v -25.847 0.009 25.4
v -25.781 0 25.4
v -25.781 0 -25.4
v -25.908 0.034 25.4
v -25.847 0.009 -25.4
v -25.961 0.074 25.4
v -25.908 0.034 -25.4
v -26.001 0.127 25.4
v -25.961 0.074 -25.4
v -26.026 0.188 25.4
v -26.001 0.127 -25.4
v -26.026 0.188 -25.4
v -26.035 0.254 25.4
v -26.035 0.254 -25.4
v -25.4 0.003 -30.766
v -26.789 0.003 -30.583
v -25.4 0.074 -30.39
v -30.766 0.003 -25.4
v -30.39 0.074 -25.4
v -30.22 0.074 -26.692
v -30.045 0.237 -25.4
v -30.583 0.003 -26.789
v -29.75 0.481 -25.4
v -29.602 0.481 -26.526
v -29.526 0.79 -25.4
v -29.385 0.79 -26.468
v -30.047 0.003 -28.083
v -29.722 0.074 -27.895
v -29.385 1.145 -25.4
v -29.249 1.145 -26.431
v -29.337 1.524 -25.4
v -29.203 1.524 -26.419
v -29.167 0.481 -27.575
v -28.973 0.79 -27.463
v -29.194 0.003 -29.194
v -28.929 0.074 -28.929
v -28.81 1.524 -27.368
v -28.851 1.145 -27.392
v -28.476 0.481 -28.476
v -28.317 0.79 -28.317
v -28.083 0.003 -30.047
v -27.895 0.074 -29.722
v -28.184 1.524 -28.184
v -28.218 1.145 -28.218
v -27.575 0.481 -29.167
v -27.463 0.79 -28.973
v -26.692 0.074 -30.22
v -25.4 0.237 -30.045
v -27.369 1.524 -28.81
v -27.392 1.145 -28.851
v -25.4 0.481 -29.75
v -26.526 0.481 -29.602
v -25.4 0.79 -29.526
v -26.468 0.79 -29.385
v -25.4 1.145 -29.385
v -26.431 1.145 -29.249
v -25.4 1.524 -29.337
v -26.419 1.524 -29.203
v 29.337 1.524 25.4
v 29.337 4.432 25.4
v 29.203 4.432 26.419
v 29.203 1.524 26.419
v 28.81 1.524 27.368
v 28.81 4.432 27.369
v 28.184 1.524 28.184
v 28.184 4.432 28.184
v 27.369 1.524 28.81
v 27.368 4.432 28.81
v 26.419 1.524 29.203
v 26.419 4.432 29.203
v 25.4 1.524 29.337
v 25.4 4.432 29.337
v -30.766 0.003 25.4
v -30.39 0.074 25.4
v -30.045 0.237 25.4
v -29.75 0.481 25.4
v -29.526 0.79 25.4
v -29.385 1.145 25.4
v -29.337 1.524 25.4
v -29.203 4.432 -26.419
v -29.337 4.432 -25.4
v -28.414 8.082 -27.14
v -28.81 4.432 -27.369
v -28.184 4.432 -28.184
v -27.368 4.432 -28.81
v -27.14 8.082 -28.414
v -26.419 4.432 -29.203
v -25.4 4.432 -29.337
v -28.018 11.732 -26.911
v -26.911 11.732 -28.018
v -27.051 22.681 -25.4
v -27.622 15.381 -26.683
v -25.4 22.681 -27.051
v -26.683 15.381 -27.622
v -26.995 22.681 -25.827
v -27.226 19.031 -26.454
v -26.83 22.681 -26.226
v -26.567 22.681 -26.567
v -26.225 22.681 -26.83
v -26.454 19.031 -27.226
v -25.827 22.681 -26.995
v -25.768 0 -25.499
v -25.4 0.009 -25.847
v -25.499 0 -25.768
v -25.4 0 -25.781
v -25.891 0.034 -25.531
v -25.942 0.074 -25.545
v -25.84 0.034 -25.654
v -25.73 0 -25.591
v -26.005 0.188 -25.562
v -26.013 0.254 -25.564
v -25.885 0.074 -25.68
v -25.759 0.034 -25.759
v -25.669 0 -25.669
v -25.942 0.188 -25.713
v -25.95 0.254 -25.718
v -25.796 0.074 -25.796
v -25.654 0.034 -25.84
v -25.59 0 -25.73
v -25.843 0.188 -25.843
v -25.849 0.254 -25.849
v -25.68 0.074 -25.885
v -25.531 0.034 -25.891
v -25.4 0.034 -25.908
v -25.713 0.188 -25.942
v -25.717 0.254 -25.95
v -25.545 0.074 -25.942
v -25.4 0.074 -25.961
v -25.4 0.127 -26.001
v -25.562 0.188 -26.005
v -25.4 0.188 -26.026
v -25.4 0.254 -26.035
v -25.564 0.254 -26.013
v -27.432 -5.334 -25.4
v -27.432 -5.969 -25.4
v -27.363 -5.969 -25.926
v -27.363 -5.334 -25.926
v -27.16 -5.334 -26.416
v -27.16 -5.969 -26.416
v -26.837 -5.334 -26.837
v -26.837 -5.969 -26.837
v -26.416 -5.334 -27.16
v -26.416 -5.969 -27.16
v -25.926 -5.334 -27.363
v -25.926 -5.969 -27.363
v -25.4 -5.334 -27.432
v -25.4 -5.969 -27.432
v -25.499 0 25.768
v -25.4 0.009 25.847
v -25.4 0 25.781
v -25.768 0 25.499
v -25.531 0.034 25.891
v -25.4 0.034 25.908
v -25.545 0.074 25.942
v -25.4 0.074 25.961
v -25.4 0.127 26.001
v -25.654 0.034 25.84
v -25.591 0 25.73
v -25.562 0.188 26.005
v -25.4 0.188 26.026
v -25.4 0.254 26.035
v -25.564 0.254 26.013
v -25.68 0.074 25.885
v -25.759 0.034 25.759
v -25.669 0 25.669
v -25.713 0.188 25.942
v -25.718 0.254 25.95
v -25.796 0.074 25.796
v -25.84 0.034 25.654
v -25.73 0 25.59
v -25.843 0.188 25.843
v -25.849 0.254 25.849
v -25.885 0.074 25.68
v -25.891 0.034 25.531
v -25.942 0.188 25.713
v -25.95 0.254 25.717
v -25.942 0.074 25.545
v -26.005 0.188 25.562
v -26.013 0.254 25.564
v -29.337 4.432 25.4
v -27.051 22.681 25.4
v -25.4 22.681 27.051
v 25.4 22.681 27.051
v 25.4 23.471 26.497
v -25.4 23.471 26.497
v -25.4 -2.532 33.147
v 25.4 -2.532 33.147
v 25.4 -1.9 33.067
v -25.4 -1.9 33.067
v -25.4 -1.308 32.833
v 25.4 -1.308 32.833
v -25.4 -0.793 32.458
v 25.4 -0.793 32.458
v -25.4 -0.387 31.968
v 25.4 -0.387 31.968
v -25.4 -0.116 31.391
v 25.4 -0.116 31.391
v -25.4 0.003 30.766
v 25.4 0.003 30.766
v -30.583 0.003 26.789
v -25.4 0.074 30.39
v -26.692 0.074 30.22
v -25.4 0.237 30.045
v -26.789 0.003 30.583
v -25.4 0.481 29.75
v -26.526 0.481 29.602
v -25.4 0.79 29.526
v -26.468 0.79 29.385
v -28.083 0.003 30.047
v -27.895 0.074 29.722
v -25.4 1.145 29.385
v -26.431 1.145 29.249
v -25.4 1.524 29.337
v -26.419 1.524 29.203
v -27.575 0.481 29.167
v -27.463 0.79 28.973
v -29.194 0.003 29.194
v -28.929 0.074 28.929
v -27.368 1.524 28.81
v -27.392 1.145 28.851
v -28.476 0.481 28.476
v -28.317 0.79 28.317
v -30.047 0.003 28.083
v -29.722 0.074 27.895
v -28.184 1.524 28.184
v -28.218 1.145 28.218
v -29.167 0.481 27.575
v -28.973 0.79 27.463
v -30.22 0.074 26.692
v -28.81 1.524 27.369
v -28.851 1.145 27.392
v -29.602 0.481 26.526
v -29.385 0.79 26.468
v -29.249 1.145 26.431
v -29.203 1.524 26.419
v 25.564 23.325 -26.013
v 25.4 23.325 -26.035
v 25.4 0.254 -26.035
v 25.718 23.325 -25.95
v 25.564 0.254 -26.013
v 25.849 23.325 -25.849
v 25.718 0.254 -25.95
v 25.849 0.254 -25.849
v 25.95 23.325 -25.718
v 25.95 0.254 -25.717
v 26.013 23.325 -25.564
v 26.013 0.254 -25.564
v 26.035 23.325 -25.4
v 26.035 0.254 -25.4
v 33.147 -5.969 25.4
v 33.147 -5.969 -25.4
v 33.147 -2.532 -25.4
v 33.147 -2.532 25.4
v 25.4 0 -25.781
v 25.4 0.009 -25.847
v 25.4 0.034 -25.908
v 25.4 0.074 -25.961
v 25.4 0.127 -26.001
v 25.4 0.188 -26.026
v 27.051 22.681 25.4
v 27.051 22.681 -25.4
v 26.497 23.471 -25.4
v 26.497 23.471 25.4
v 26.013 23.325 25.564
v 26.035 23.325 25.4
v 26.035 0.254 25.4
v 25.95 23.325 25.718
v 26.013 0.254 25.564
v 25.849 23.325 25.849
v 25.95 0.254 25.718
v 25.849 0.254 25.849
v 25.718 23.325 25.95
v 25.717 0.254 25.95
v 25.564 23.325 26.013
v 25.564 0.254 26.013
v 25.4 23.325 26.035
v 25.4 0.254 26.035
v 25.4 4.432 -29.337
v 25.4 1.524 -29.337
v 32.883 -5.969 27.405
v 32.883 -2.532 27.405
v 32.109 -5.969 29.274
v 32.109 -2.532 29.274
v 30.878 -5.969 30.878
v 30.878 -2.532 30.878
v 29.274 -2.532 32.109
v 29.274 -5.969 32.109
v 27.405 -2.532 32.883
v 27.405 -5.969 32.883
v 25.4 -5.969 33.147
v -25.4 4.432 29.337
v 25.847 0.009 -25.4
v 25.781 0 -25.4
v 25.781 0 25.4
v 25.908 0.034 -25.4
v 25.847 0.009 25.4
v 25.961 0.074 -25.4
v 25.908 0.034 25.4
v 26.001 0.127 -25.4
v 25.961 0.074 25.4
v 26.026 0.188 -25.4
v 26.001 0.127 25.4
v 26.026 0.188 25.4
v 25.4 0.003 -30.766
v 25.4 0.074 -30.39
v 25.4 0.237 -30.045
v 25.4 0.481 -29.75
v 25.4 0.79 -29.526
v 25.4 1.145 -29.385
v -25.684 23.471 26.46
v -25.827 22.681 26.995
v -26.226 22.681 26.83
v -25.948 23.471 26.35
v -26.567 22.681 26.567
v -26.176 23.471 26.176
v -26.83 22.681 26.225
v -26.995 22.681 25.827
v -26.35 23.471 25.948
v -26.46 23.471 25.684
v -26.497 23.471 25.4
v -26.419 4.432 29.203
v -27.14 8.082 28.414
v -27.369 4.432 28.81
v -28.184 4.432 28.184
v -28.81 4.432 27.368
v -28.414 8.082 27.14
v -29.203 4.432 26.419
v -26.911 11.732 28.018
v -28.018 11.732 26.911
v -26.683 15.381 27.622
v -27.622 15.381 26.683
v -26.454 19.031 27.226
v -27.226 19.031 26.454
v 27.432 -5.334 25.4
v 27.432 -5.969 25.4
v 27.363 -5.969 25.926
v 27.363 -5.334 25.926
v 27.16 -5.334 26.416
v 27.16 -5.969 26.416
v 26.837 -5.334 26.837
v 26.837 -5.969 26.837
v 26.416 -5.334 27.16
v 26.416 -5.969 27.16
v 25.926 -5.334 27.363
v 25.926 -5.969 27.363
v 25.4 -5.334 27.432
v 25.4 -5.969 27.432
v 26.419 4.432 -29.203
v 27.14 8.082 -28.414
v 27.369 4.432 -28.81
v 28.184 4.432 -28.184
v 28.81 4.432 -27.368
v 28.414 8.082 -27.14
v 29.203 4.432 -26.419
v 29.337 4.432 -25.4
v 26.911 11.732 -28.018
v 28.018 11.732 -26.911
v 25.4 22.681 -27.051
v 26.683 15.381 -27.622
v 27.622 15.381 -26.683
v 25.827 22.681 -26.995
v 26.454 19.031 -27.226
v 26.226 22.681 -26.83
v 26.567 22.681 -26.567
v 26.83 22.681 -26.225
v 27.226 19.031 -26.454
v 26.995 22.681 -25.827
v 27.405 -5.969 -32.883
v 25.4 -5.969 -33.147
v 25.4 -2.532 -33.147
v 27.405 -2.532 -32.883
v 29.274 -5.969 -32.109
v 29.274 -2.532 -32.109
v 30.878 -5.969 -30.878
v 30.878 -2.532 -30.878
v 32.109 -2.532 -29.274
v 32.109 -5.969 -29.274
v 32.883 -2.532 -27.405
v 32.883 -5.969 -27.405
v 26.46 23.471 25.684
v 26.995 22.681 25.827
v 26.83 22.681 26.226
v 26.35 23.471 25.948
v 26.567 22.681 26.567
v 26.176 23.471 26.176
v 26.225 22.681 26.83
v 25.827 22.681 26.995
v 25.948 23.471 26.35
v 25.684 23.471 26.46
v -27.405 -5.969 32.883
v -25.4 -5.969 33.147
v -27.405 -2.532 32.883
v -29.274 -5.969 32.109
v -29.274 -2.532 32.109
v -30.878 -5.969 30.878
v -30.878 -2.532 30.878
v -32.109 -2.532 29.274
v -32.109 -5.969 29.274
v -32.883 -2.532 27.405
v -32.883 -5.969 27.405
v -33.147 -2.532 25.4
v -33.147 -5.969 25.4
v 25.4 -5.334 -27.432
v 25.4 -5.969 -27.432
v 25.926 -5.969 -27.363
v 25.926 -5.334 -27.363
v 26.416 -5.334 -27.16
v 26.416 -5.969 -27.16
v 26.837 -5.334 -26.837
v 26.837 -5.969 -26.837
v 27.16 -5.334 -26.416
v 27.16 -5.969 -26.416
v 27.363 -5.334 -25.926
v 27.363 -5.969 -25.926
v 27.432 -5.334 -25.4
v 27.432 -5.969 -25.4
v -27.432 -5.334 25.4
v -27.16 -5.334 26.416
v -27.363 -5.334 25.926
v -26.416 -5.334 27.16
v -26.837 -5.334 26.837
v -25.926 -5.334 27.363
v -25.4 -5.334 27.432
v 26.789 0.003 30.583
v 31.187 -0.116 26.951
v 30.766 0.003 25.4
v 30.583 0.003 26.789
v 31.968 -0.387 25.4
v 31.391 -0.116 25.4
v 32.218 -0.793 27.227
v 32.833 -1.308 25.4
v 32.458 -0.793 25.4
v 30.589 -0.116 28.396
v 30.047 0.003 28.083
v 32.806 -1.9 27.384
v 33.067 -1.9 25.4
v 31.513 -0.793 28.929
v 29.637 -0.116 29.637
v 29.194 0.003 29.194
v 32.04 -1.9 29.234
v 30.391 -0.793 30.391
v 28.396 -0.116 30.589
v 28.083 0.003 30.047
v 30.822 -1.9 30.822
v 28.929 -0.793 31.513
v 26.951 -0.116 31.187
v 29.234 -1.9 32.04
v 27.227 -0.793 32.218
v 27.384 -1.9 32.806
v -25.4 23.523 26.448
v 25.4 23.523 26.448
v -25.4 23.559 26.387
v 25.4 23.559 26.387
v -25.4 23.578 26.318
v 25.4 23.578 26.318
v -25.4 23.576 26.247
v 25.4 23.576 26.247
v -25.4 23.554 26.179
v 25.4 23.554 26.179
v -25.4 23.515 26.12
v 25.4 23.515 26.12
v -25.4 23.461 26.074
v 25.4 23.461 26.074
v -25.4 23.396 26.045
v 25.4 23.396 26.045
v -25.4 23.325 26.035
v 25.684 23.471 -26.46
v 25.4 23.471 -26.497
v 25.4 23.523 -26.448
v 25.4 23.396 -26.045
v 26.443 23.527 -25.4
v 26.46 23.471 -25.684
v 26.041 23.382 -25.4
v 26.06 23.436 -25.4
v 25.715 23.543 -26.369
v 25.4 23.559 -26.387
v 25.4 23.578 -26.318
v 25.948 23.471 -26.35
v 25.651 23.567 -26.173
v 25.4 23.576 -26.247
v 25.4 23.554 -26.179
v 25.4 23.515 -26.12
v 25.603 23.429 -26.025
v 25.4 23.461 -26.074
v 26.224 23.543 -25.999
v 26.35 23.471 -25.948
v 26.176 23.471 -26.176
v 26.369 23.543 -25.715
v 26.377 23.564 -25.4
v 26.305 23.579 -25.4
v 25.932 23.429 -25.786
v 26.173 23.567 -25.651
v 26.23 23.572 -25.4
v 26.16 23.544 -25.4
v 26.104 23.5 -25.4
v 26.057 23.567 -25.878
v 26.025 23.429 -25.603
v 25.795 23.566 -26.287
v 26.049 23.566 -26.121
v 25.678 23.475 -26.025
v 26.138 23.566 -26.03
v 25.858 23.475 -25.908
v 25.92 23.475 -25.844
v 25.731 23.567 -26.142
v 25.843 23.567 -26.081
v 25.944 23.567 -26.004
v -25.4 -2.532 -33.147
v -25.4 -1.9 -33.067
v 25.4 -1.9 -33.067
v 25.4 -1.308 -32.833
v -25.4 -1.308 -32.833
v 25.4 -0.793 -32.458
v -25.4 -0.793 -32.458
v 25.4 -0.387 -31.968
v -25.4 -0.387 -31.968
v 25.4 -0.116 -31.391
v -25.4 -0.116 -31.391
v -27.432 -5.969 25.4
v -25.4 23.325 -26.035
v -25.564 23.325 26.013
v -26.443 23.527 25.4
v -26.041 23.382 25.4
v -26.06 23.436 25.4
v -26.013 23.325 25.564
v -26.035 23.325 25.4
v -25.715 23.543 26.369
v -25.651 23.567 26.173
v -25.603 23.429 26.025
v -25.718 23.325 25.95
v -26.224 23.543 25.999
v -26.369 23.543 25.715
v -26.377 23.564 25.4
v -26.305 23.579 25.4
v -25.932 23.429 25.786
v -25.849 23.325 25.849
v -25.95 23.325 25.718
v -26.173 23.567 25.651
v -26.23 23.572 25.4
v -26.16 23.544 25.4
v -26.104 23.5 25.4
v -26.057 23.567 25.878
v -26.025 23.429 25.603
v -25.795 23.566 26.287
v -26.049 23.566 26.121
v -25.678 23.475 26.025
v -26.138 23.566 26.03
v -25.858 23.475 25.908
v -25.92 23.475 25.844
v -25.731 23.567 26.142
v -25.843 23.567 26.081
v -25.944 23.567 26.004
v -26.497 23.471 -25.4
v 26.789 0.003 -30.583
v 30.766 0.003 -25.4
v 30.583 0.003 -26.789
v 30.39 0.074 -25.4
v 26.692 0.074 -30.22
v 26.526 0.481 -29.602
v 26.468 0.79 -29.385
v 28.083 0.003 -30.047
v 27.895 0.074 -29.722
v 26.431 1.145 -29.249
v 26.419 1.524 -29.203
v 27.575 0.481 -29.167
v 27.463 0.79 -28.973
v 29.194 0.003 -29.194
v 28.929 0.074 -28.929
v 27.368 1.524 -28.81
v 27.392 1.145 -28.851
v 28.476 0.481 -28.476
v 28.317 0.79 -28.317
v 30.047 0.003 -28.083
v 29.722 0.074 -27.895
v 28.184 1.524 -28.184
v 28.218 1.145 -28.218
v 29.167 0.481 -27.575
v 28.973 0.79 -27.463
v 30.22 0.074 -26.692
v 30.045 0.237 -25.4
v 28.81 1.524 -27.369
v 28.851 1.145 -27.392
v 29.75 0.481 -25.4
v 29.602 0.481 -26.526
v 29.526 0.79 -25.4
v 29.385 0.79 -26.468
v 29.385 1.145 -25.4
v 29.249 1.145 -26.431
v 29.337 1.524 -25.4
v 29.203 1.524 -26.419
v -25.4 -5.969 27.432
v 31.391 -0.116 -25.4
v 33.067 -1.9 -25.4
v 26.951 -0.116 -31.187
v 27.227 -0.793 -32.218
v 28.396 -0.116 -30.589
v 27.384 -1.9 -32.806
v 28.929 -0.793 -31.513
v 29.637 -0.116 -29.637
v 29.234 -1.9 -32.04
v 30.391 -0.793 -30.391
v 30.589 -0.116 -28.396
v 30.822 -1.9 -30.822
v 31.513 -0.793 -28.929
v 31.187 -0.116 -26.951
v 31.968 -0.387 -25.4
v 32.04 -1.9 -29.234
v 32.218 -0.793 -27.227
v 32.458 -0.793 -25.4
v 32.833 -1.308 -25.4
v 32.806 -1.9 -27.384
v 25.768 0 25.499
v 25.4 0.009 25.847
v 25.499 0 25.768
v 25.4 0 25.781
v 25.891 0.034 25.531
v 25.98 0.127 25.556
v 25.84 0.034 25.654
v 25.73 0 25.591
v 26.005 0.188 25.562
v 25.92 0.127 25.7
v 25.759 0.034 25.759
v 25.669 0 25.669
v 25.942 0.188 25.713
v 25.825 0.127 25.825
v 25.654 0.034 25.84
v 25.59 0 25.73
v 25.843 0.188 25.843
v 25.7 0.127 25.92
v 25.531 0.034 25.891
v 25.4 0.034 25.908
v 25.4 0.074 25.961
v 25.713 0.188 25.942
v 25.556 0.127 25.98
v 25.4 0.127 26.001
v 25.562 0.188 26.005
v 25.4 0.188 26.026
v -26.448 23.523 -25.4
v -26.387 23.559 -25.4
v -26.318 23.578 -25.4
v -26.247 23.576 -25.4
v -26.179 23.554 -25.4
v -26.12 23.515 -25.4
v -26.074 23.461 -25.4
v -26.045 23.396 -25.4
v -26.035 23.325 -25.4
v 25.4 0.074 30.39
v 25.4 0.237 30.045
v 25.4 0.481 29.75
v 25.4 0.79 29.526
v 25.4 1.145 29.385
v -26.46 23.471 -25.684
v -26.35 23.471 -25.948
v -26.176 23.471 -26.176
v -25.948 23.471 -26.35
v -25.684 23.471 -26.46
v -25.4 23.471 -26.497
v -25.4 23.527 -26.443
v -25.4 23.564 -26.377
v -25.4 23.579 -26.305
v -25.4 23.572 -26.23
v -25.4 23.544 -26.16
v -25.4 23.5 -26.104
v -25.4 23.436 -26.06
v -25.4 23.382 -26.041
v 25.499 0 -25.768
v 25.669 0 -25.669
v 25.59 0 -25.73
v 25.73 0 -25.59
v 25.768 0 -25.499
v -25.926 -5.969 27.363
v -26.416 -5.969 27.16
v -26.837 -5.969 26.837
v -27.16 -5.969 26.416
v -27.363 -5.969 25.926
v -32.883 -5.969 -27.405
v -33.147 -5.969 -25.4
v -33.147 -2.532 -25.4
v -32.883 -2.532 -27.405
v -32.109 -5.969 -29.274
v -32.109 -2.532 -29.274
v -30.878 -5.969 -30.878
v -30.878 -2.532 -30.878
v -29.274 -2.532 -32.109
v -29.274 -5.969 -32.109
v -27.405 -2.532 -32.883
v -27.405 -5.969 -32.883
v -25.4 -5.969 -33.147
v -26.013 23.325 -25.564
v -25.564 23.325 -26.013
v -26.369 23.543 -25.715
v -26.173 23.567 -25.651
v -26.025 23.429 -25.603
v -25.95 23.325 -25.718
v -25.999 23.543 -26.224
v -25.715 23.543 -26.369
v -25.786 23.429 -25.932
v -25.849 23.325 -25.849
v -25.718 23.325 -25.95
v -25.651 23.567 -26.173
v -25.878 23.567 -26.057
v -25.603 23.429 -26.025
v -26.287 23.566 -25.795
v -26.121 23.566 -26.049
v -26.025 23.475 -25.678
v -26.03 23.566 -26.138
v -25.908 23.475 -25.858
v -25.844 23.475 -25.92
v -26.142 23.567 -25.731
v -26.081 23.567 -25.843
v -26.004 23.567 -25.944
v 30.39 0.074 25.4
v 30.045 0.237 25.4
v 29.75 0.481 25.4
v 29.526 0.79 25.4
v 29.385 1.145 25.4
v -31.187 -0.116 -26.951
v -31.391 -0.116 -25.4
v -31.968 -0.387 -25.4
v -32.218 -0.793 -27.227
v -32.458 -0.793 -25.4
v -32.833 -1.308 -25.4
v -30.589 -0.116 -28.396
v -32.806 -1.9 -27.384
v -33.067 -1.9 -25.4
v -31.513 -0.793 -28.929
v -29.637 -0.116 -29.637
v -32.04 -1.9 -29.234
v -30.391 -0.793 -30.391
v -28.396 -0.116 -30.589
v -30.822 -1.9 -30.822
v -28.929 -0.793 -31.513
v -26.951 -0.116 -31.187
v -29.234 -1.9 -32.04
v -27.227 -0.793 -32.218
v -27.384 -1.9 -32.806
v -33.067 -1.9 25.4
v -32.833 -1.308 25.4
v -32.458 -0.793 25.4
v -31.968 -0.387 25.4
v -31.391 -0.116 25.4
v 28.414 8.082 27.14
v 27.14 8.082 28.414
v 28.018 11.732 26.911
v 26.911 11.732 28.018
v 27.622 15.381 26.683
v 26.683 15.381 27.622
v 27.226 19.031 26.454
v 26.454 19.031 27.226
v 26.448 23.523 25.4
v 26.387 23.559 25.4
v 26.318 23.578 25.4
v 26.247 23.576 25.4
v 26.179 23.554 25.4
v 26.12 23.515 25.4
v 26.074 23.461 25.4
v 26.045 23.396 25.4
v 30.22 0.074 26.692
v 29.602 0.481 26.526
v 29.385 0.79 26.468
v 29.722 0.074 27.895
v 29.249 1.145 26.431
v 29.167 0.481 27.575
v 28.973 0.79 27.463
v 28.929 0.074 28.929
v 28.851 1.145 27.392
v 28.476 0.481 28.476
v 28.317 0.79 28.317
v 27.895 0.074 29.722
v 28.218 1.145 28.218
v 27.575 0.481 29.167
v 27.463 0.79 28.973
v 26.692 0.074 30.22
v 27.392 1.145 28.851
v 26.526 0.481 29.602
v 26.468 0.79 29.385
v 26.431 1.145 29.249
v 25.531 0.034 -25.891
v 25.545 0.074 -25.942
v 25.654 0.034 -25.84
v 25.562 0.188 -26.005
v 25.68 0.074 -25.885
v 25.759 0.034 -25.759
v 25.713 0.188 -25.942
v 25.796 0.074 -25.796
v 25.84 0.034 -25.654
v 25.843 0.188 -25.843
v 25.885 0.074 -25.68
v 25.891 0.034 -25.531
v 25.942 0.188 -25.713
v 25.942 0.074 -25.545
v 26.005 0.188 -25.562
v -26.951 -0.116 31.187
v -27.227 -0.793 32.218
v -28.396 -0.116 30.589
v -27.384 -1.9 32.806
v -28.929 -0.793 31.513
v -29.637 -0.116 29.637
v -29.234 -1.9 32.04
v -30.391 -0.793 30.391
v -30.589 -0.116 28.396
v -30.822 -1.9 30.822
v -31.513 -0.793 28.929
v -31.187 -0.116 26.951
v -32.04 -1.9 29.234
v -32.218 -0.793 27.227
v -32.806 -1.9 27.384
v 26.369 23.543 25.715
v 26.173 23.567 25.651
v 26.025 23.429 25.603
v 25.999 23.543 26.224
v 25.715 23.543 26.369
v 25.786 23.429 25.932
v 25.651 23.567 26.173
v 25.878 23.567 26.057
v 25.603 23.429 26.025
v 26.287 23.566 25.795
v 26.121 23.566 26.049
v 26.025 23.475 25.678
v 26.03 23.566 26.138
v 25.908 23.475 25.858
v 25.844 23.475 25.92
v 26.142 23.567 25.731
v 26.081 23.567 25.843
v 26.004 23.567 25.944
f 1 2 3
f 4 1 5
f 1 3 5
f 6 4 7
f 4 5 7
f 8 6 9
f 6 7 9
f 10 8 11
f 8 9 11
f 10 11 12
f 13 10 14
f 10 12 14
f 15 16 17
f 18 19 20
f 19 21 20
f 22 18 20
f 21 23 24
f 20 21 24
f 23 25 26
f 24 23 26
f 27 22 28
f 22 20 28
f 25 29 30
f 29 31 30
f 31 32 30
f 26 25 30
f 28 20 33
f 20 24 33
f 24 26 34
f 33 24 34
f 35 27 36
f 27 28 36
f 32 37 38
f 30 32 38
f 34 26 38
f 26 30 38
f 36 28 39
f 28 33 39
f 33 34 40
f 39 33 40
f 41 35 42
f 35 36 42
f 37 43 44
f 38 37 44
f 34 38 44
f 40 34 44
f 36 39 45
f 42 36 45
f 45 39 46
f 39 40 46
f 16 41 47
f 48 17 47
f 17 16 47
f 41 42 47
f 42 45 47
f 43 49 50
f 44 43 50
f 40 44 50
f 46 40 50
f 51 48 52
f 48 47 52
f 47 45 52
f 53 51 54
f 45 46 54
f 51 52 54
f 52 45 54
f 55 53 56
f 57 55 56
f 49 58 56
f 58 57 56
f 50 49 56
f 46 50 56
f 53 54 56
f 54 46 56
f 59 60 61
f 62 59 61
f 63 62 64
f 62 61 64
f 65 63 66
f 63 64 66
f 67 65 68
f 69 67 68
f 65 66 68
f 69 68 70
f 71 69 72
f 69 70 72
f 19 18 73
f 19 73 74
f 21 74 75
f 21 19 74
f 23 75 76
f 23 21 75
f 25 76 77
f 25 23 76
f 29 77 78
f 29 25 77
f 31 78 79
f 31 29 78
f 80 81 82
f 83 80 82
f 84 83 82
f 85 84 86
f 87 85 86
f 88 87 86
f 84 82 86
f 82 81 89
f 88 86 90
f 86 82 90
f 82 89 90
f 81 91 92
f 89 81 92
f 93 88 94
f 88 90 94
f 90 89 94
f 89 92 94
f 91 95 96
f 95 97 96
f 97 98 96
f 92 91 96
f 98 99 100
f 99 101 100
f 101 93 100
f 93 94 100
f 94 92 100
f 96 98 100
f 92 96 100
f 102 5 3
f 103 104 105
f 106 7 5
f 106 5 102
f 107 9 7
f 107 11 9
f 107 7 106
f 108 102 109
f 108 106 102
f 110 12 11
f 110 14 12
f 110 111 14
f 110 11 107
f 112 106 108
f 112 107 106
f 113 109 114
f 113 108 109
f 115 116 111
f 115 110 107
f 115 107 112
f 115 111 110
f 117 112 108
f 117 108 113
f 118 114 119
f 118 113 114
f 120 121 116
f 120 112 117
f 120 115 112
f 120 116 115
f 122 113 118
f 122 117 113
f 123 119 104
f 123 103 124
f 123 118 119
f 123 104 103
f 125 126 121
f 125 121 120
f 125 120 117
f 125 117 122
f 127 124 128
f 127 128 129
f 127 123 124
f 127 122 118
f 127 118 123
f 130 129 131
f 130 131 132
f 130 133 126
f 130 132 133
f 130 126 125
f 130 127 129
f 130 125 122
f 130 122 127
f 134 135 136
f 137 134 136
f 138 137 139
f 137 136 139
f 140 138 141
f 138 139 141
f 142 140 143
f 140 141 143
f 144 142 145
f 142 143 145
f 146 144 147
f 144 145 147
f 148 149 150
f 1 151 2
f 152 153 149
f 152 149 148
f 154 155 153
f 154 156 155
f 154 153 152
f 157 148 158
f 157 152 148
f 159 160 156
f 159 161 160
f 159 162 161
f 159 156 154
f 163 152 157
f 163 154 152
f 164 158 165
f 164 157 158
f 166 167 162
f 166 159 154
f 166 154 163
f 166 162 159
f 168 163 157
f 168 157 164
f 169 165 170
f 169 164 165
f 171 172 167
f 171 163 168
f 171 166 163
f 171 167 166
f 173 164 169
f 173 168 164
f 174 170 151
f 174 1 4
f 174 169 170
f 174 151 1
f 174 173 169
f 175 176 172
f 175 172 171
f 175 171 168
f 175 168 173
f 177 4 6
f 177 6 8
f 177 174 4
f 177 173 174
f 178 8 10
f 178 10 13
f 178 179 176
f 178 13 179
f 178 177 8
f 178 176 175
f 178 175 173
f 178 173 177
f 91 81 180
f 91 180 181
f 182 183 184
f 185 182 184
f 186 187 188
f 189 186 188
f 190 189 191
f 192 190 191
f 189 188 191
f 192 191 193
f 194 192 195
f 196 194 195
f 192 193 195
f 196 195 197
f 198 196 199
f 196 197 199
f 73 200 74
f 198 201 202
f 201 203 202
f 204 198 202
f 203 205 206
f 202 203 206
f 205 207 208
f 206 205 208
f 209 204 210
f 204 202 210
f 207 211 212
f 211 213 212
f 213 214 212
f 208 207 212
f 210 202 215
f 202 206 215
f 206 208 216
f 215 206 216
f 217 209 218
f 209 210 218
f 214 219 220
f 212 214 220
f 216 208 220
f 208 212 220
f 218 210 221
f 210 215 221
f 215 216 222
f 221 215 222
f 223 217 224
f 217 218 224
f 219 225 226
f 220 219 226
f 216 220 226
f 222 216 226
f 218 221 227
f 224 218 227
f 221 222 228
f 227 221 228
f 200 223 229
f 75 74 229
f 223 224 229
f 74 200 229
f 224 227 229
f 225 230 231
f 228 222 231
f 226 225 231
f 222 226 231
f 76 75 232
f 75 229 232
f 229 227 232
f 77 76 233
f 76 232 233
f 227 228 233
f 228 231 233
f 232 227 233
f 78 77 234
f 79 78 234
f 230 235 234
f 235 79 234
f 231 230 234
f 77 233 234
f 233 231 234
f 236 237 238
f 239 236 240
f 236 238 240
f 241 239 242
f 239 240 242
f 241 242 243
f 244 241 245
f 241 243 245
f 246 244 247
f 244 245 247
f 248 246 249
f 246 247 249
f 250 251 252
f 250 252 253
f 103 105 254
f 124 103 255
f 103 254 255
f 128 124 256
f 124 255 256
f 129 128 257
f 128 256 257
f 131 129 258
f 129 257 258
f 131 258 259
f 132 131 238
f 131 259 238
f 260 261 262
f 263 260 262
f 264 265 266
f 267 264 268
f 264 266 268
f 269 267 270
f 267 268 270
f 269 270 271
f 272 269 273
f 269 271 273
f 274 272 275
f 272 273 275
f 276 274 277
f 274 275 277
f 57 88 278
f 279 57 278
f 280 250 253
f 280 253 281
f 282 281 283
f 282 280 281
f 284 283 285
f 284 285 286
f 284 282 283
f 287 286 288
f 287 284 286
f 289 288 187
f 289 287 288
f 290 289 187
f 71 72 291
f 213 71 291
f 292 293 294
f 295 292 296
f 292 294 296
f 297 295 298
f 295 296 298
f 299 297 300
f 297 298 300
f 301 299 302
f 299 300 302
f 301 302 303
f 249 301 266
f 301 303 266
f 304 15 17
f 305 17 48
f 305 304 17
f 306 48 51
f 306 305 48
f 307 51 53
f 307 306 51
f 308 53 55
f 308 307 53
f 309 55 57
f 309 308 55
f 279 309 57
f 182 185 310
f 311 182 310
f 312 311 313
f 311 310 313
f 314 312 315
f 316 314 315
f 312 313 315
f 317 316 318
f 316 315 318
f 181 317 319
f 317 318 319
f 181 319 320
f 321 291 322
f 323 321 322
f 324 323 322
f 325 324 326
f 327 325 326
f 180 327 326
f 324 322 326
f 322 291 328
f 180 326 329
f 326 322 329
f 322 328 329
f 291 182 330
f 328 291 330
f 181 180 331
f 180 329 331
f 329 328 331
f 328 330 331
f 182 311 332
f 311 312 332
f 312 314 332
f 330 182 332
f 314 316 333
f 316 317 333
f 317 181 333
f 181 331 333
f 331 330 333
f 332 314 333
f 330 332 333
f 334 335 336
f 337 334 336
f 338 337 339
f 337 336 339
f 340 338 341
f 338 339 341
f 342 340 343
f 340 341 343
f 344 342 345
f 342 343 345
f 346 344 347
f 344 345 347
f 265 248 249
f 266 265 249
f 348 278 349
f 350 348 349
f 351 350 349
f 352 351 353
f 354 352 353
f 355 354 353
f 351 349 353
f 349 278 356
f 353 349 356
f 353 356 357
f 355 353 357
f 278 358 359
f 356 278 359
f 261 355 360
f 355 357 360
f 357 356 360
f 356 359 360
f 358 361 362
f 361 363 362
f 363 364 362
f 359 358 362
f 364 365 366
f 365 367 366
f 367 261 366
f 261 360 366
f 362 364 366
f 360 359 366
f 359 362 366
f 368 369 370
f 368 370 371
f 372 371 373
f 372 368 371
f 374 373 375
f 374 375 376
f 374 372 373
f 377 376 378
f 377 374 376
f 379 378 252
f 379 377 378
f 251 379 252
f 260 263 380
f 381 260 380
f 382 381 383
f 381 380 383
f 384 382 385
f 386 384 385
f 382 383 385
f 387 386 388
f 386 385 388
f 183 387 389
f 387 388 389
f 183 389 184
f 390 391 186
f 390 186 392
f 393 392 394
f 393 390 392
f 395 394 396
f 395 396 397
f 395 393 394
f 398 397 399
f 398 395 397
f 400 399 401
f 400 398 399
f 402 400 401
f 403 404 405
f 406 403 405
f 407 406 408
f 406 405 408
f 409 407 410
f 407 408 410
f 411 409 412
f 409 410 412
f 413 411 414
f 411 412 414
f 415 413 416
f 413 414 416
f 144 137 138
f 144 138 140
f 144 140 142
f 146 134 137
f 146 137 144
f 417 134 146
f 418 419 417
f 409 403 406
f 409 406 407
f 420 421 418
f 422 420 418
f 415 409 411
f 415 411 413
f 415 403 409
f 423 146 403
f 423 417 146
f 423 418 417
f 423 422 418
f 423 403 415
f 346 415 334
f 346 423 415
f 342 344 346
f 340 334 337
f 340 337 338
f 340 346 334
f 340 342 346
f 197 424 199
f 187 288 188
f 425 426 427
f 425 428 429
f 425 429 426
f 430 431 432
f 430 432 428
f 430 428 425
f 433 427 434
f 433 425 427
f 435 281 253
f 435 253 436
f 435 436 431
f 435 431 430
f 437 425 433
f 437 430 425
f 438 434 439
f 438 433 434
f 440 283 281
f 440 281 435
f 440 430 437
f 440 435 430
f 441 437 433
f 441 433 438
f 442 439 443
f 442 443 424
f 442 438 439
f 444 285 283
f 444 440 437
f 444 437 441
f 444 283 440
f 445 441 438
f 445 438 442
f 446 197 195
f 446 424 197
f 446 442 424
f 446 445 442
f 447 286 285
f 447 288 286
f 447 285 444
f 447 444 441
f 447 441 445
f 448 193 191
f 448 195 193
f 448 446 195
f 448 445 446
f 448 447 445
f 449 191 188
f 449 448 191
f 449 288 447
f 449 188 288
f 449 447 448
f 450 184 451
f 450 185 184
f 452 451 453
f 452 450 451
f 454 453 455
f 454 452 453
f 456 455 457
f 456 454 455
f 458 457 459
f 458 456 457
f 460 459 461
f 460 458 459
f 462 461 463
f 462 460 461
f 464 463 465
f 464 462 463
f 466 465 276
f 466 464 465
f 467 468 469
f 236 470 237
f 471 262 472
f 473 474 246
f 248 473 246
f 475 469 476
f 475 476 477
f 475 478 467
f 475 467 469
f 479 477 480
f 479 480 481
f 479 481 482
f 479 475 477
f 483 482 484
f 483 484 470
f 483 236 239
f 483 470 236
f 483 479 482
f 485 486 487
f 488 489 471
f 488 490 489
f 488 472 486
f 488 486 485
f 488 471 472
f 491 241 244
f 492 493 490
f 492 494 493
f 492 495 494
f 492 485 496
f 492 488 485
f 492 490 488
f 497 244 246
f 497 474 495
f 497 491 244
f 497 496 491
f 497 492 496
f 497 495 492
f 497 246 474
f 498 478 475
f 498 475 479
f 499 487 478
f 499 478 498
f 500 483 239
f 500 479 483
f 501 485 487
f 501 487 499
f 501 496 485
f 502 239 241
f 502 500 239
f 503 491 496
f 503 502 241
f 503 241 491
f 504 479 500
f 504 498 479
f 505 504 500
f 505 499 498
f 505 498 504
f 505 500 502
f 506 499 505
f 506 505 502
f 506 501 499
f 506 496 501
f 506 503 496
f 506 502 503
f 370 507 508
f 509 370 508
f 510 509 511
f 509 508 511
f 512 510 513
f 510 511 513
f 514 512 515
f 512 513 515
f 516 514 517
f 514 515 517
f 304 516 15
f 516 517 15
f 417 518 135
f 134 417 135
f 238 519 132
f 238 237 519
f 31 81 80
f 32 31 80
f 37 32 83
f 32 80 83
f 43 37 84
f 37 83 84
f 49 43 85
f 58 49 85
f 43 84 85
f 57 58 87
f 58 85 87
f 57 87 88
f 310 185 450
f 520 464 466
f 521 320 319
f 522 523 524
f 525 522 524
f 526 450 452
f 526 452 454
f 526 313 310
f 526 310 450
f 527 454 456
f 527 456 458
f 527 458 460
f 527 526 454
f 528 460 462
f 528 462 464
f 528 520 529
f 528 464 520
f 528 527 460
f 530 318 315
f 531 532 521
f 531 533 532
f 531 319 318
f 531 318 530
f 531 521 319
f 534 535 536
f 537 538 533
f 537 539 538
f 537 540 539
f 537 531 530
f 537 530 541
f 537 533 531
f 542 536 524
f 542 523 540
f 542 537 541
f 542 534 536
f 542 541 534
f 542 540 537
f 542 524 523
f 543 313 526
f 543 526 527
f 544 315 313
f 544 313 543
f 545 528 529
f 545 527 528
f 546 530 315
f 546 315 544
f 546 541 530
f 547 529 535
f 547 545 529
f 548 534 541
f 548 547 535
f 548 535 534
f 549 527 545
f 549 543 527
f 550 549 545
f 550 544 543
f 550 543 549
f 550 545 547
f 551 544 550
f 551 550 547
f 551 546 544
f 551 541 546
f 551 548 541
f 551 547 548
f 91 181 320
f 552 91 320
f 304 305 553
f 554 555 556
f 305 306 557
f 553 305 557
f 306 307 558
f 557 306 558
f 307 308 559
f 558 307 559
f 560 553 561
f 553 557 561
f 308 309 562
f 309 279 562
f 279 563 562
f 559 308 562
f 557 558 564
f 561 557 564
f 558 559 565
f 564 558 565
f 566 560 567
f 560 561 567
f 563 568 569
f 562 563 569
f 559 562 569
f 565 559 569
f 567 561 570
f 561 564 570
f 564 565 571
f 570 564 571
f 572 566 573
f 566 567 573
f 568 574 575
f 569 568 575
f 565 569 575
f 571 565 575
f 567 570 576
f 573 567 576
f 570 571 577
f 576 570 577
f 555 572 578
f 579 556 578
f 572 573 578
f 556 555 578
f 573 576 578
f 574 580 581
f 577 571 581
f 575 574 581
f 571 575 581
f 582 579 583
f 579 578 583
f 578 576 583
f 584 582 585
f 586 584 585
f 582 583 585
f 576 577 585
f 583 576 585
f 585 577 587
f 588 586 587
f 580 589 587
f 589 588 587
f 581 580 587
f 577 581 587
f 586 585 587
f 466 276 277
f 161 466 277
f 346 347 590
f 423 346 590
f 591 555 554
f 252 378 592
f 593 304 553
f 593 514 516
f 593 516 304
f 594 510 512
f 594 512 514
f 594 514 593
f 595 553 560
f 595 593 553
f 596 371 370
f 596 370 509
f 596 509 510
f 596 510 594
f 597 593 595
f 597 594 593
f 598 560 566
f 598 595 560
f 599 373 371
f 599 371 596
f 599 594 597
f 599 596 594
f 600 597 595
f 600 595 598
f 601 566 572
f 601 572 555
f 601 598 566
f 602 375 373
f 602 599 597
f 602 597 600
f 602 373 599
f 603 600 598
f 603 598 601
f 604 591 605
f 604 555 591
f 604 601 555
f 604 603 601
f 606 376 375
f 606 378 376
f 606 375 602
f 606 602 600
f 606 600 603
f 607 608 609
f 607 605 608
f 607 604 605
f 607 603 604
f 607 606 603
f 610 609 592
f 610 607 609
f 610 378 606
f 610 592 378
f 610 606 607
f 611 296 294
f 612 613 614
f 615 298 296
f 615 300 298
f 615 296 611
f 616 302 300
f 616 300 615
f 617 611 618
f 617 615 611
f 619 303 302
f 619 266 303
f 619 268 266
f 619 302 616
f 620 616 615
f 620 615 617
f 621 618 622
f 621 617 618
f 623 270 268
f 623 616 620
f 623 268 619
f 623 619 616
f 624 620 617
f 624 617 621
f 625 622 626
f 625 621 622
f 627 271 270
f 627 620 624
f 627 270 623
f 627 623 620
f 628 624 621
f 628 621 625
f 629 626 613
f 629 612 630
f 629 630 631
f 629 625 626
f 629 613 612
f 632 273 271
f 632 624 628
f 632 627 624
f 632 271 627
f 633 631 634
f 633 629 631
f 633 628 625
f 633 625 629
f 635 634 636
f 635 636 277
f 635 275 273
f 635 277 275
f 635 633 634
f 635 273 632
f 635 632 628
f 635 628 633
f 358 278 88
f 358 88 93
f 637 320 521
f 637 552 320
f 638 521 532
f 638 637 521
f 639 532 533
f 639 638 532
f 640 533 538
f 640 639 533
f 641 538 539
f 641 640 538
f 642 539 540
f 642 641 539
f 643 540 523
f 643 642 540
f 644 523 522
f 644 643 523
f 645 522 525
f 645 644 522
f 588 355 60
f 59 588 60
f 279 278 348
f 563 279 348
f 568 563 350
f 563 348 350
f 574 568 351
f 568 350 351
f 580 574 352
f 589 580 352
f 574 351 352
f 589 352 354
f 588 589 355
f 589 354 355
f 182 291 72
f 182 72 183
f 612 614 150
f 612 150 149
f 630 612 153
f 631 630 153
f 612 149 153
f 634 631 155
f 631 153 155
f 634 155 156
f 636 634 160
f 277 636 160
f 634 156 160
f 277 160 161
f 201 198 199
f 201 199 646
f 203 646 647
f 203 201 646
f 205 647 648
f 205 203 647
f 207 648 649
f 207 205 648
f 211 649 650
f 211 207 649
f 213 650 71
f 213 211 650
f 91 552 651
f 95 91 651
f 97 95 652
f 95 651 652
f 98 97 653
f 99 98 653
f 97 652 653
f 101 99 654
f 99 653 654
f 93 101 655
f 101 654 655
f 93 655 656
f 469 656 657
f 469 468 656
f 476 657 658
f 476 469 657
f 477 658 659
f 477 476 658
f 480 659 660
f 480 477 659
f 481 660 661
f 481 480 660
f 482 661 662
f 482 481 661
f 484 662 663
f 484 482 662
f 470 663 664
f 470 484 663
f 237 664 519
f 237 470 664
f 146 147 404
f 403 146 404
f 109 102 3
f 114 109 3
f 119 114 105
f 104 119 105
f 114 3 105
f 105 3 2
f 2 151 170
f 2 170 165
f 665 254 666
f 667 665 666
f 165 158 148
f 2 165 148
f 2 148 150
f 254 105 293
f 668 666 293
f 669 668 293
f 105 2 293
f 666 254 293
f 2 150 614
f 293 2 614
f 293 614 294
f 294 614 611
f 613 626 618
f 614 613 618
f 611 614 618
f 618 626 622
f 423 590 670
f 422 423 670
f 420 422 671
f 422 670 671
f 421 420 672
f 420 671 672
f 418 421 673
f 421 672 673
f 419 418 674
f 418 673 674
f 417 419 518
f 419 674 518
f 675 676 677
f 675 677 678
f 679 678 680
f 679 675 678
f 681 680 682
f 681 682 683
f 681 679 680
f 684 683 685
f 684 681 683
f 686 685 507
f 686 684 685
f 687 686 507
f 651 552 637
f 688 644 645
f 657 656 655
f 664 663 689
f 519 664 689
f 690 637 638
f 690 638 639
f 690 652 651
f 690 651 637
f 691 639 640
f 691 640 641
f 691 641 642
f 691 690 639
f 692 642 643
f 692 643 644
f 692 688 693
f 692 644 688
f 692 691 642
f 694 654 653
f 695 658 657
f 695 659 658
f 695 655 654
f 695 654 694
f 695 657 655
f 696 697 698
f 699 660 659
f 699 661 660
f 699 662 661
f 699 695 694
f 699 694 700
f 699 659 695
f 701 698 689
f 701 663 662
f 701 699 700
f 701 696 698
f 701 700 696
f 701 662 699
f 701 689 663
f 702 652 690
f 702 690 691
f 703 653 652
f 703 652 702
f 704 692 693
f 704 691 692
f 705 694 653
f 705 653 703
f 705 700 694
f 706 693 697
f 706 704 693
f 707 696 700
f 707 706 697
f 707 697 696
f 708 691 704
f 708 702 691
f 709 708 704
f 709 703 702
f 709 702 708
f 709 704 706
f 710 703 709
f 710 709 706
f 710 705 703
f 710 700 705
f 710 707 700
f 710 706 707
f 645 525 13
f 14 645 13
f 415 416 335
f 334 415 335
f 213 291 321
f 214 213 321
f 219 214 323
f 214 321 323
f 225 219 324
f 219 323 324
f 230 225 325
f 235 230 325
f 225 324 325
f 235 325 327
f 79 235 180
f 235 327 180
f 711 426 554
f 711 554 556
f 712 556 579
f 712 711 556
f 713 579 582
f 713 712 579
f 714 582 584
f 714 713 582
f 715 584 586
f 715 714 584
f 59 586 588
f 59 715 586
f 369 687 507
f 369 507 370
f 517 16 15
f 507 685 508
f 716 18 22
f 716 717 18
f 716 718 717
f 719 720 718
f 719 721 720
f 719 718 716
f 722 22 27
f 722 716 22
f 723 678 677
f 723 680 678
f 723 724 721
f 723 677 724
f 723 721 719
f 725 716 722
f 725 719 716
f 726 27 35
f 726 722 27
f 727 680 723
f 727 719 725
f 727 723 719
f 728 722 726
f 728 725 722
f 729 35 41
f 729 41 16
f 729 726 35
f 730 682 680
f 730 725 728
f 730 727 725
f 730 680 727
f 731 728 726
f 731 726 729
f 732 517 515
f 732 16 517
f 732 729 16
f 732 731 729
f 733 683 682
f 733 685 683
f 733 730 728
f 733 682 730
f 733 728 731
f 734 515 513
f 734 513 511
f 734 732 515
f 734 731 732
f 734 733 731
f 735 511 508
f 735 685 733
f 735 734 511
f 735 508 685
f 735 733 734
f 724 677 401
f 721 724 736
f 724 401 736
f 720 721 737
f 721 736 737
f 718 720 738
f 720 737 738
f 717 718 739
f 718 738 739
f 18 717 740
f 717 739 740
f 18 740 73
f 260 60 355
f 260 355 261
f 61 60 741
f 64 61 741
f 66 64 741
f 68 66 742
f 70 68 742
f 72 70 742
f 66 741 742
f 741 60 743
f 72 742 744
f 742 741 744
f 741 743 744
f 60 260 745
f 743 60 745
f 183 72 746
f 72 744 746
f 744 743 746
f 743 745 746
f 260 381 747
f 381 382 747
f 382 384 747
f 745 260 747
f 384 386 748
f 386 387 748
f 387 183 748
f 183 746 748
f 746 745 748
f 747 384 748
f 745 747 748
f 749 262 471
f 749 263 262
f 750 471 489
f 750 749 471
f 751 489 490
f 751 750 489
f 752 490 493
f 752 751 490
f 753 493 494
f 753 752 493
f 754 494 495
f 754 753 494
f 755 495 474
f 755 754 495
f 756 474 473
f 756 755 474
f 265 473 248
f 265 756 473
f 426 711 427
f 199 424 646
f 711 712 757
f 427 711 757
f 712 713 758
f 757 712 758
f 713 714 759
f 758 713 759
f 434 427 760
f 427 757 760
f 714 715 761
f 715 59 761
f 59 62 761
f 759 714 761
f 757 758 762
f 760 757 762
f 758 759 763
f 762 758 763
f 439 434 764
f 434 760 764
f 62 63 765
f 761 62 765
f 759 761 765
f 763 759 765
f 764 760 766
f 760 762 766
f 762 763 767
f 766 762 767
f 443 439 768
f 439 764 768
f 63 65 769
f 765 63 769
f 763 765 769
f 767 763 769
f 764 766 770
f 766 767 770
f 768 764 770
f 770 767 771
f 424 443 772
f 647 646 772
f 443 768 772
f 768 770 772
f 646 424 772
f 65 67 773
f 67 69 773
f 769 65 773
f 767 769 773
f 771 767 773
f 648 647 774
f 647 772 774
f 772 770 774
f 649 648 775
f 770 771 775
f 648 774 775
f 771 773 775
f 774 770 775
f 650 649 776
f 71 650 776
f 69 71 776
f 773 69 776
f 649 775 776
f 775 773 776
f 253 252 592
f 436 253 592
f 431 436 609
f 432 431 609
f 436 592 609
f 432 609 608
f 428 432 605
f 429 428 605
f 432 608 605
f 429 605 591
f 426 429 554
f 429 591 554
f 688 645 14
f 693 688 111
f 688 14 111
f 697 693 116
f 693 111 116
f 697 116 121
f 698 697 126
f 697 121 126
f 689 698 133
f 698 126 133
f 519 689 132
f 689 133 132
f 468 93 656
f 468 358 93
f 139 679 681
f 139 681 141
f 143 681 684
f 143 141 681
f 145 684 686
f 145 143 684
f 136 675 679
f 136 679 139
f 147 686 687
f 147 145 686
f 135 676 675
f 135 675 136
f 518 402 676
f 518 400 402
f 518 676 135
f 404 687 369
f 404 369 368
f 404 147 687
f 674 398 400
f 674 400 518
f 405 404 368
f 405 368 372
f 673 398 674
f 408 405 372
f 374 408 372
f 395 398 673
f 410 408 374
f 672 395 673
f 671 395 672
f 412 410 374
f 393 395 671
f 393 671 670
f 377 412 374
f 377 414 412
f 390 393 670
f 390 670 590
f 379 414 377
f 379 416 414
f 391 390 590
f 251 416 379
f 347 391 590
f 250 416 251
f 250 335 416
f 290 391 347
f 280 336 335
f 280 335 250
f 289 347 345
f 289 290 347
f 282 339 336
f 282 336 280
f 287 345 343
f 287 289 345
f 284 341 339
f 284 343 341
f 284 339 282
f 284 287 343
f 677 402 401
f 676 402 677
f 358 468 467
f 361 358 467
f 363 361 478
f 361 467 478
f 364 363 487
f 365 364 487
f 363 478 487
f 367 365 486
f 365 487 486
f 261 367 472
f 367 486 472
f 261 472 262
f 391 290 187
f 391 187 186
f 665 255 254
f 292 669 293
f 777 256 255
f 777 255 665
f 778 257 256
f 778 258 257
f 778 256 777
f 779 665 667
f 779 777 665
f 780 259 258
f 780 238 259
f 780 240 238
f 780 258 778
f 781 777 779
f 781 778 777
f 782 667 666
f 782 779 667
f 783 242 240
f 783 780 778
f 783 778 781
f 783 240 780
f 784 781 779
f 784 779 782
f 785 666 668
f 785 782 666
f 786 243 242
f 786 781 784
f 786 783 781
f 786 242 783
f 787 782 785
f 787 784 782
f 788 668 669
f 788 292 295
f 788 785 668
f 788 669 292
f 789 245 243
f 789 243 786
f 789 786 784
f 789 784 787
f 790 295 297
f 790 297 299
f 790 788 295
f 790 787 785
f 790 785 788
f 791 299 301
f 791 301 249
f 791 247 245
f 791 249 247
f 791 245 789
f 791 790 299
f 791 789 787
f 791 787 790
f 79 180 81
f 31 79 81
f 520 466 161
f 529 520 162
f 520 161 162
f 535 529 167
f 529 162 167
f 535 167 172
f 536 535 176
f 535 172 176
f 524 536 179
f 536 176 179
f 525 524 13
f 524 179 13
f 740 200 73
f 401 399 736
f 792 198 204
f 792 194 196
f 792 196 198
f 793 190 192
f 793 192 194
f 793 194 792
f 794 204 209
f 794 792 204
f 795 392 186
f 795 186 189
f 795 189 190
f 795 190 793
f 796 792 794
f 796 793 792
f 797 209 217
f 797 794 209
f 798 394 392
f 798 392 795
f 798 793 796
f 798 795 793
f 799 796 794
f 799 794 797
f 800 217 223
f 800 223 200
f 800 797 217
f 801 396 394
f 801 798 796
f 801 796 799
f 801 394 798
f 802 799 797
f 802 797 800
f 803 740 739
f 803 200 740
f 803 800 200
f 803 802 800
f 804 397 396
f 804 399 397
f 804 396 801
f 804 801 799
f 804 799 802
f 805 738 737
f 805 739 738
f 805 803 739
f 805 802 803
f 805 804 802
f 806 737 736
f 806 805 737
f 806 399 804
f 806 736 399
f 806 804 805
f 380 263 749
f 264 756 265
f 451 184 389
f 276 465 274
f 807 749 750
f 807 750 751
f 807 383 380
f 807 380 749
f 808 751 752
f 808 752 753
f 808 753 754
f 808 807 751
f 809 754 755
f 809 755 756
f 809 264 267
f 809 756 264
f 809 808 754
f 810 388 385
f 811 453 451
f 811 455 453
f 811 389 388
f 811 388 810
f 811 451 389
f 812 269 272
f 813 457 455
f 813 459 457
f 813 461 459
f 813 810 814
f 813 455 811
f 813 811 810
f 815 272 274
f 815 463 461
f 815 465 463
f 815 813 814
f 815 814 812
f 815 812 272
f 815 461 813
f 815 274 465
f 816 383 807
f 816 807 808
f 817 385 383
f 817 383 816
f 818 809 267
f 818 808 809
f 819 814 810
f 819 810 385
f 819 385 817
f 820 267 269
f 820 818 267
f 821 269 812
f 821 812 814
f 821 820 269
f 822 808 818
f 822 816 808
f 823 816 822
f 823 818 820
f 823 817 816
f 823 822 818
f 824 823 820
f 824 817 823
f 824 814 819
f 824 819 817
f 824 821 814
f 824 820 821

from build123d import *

# Parameters (mm, degrees)
BOSS_EXTRUDE1_DEPTH = 5.969
CUT_EXTRUDE1_DEPTH  = 0.635
BOSS_EXTRUDE2_DEPTH = 5.969
FILLET4_R           = 1.524
FILLET5_R           = 2.54
FILLET3_R           = 0.254


with BuildPart() as part:
    # Sweep1: sweep along a path in Sketch1
    with BuildLine(Plane(origin=(0, 0, 0), x_dir=(1, 0, 0), z_dir=(0, 1, 0))) as sweep1_path:
        Line((-25.4, 28.575), (25.4, 28.575))
        ThreePointArc((25.4, 28.575), (27.64506403, 27.64506403), (28.575, 25.4))
        Line((28.575, 25.4), (28.575, -25.4))
        ThreePointArc((28.575, -25.4), (27.64506403, -27.64506403), (25.4, -28.575))
        Line((25.4, -28.575), (-25.4, -28.575))
        ThreePointArc((-25.4, -28.575), (-27.64506403, -27.64506403), (-28.575, -25.4))
        Line((-28.575, -25.4), (-28.575, 25.4))
        ThreePointArc((-28.575, 25.4), (-27.64506403, 27.64506403), (-25.4, 28.575))
    # Sketch2 → Sweep1 (sweep)
    with BuildSketch(Plane(origin=(0, 0, 0), x_dir=(0, 0, -1), z_dir=(1, 0, 0))):
        Polygon((27.051, 22.68081304), (29.337, 4.432166315), (29.337, 0), (26.035, 0), (26.035, 24.13), align=None)
    sweep(path=sweep1_path.line)

    # Sketch3 → Boss-Extrude1 (add)
    with BuildSketch(Plane.XZ):
        with BuildLine():
            Line((-25.4, -29.337), (0, -29.337))
            Line((0, -29.337), (25.4, -29.337))
            ThreePointArc((25.4, -29.337), (28.183879398, -28.183879398), (29.337, -25.4))
            Line((29.337, -25.4), (29.337, 25.4))
            ThreePointArc((29.337, 25.4), (28.183879398, 28.183879398), (25.4, 29.337))
            Line((25.4, 29.337), (-25.4, 29.337))
            ThreePointArc((-25.4, 29.337), (-28.183879398, 28.183879398), (-29.337, 25.4))
            Line((-29.337, 25.4), (-29.337, -25.4))
            ThreePointArc((-29.337, -25.4), (-28.183879398, -28.183879398), (-25.4, -29.337))
        make_face()
    extrude(amount=BOSS_EXTRUDE1_DEPTH)

    # Sketch4 → Cut-Extrude1 (cut)
    with BuildSketch(Plane.XZ.offset(5.969)):
        with BuildLine():
            Line((-25.4, -27.432), (25.4, -27.432))
            ThreePointArc((25.4, -27.432), (26.836840979, -26.836840979), (27.432, -25.4))
            Line((27.432, -25.4), (27.432, 25.4))
            ThreePointArc((27.432, 25.4), (26.836840979, 26.836840979), (25.4, 27.432))
            Line((25.4, 27.432), (-25.4, 27.432))
            ThreePointArc((-25.4, 27.432), (-26.836840979, 26.836840979), (-27.432, 25.4))
            Line((-27.432, 25.4), (-27.432, -25.4))
            ThreePointArc((-27.432, -25.4), (-26.836840979, -26.836840979), (-25.4, -27.432))
        make_face()
    extrude(amount=-CUT_EXTRUDE1_DEPTH, mode=Mode.SUBTRACT)

    # Sketch5 → Boss-Extrude2 (add)
    with BuildSketch(Plane.XZ.offset(5.969)):
        with BuildLine():
            Line((-33.147, 25.4), (-33.147, -25.4))
            ThreePointArc((-33.147, -25.4), (-30.877956234, -30.877956234), (-25.4, -33.147))
            Line((-25.4, -33.147), (25.4, -33.147))
            ThreePointArc((25.4, -33.147), (30.877956234, -30.877956234), (33.147, -25.4))
            Line((33.147, -25.4), (33.147, 25.4))
            ThreePointArc((33.147, 25.4), (30.877956234, 30.877956234), (25.4, 33.147))
            Line((25.4, 33.147), (-25.4, 33.147))
            ThreePointArc((-25.4, 33.147), (-30.877956234, 30.877956234), (-33.147, 25.4))
        make_face()
        with BuildLine():
            Line((-27.432, 25.4), (-27.432, -25.4))
            ThreePointArc((-27.432, -25.4), (-26.836840979, -26.836840979), (-25.4, -27.432))
            Line((-25.4, -27.432), (25.4, -27.432))
            ThreePointArc((25.4, -27.432), (26.836840979, -26.836840979), (27.432, -25.4))
            Line((27.432, -25.4), (27.432, 25.4))
            ThreePointArc((27.432, 25.4), (26.836840979, 26.836840979), (25.4, 27.432))
            Line((25.4, 27.432), (-25.4, 27.432))
            ThreePointArc((-25.4, 27.432), (-26.836840979, 26.836840979), (-27.432, 25.4))
        make_face(mode=Mode.SUBTRACT)
    extrude(amount=-BOSS_EXTRUDE2_DEPTH)

    # Fillet4
    fillet4_edges = [part.edges().sort_by_distance(p)[0] for p in [
        (0, 0, -29.337),
        (0, 0, -29.337),
        (-28.183879398, 0, -28.183879398),
        (-29.337, 0, 0),
        (-28.183879398, 0, 28.183879398),
        (0, 0, 29.337),
        (28.183879398, 0, 28.183879398),
        (29.337, 0, 0),
        (28.183879398, 0, -28.183879398),
    ]]
    fillet(fillet4_edges, radius=FILLET4_R)

    # Fillet5
    # the kernel refuses this fillet: 2.54 mm, written as the material it takes off along each edge
    with BuildSketch(Plane(origin=(-25.4, 0, -25.4), x_dir=(-1, 0, 0), z_dir=(0, 0, 1))) as fillet5_piece_1:
        with BuildLine():
            CenterArc((5.207, 2.532054733), FILLET5_R, 273.583321698, 86.416678302)
            Line((7.747, 2.532054733), (8.001, 2.532054733))
            Line((8.001, 2.532054733), (8.001, 0))
            Line((8.001, 0), (7.747, -0.254))
            ThreePointArc((7.747, -0.254), (5.461, -0.254), (5.381625, -0.256482896))
            Line((5.381625, -0.256482896), (5.36575, -0.002979475))
        make_face()
    revolve(axis=Axis((-25.4, 0, -25.4), (0, -1, 0)), revolution_arc=90, mode=Mode.SUBTRACT)
    with BuildSketch(Plane(origin=(-33.147, 0, 25.4), x_dir=(0.9999992172213047, 0.001251222113716365, 0), z_dir=(0, 0, -1)), Plane(origin=(25.4, 0, 33.147), x_dir=(0, 0.0012512221137164234, -0.9999992172213047), z_dir=(-1, 0, 0)), Plane(origin=(33.147, 0, -25.4), x_dir=(-0.9999992172213047, 0.0012512221137164405, 0), z_dir=(0, 0, 1)), Plane(origin=(-25.4, 0, -33.147), x_dir=(0, 0.001251222113716569, 0.9999992172213047), z_dir=(1, 0, 0))) as fillet5_piece_2:
        with BuildLine():
            CenterArc((2.536829849, 2.535230855), FILLET5_R, 180.071689765, 86.416678302)
            Line((-0.003168163, 2.532052751), (-0.257167964, 2.531734941))
            Line((-0.257167964, 2.531734941), (-0.253999801, -0.00031781))
            Line((-0.253999801, -0.00031781), (0.00031781, -0.253999801))
            ThreePointArc((0.00031781, -0.253999801), (2.286316021, -0.251139507), (2.365694066, -0.253523086))
            Line((2.365694066, -0.253523086), (2.381251864, 0))
        make_face()
    extrude(amount=50.8, mode=Mode.SUBTRACT)
    with BuildSketch(Plane(origin=(-25.4, 0, 25.4), x_dir=(0, 0, 1), z_dir=(1, 0, 0))) as fillet5_piece_3:
        with BuildLine():
            CenterArc((5.207, 2.532054733), FILLET5_R, 273.583321698, 86.416678302)
            Line((7.747, 2.532054733), (8.001, 2.532054733))
            Line((8.001, 2.532054733), (8.001, 0))
            Line((8.001, 0), (7.747, -0.254))
            ThreePointArc((7.747, -0.254), (5.461, -0.254), (5.381625, -0.256482896))
            Line((5.381625, -0.256482896), (5.36575, -0.002979475))
        make_face()
    revolve(axis=Axis((-25.4, 0, 25.4), (0, -1, 0)), revolution_arc=90, mode=Mode.SUBTRACT)
    with BuildSketch(Plane(origin=(25.4, 0, 25.4), x_dir=(1, 0, 0), z_dir=(0, 0, -1))) as fillet5_piece_4:
        with BuildLine():
            CenterArc((5.207, 2.532054733), FILLET5_R, 273.583321698, 86.416678302)
            Line((7.747, 2.532054733), (8.001, 2.532054733))
            Line((8.001, 2.532054733), (8.001, 0))
            Line((8.001, 0), (7.747, -0.254))
            ThreePointArc((7.747, -0.254), (5.461, -0.254), (5.381625, -0.256482896))
            Line((5.381625, -0.256482896), (5.36575, -0.002979475))
        make_face()
    revolve(axis=Axis((25.4, 0, 25.4), (0, -1, 0)), revolution_arc=90, mode=Mode.SUBTRACT)
    with BuildSketch(Plane(origin=(25.4, 0, -25.4), x_dir=(0, 0, -1), z_dir=(-1, 0, 0))) as fillet5_piece_5:
        with BuildLine():
            CenterArc((5.207, 2.532054733), FILLET5_R, 273.583321698, 86.416678302)
            Line((7.747, 2.532054733), (8.001, 2.532054733))
            Line((8.001, 2.532054733), (8.001, 0))
            Line((8.001, 0), (7.747, -0.254))
            ThreePointArc((7.747, -0.254), (5.461, -0.254), (5.381625, -0.256482896))
            Line((5.381625, -0.256482896), (5.36575, -0.002979475))
        make_face()
    revolve(axis=Axis((25.4, 0, -25.4), (0, -1, 0)), revolution_arc=90, mode=Mode.SUBTRACT)

    # Fillet3
    fillet3_edges = [part.edges().sort_by_distance(p)[0] for p in [
        (25.849012806, 24.13, 25.849012806),
        (0, 0, 26.035),
        (0, 24.13, 26.035),
        (-25.849012806, 0, 25.849012806),
        (-25.849012806, 24.13, 25.849012806),
        (0, 0, -26.035),
        (-26.035, 0, 0),
        (-26.035, 24.13, 0),
        (-25.849012806, 0, -25.849012806),
        (-25.849012806, 24.13, -25.849012806),
        (0, 0, -26.035),
        (0, 24.13, -26.035),
        (0, 24.13, -26.035),
        (25.849012806, 0, -25.849012806),
        (25.849012806, 24.13, -25.849012806),
        (26.035, 0, 0),
        (26.035, 24.13, 0),
        (25.849012806, 0, 25.849012806),
    ]]
    fillet(fillet3_edges, radius=FILLET3_R)


solid = part.part
